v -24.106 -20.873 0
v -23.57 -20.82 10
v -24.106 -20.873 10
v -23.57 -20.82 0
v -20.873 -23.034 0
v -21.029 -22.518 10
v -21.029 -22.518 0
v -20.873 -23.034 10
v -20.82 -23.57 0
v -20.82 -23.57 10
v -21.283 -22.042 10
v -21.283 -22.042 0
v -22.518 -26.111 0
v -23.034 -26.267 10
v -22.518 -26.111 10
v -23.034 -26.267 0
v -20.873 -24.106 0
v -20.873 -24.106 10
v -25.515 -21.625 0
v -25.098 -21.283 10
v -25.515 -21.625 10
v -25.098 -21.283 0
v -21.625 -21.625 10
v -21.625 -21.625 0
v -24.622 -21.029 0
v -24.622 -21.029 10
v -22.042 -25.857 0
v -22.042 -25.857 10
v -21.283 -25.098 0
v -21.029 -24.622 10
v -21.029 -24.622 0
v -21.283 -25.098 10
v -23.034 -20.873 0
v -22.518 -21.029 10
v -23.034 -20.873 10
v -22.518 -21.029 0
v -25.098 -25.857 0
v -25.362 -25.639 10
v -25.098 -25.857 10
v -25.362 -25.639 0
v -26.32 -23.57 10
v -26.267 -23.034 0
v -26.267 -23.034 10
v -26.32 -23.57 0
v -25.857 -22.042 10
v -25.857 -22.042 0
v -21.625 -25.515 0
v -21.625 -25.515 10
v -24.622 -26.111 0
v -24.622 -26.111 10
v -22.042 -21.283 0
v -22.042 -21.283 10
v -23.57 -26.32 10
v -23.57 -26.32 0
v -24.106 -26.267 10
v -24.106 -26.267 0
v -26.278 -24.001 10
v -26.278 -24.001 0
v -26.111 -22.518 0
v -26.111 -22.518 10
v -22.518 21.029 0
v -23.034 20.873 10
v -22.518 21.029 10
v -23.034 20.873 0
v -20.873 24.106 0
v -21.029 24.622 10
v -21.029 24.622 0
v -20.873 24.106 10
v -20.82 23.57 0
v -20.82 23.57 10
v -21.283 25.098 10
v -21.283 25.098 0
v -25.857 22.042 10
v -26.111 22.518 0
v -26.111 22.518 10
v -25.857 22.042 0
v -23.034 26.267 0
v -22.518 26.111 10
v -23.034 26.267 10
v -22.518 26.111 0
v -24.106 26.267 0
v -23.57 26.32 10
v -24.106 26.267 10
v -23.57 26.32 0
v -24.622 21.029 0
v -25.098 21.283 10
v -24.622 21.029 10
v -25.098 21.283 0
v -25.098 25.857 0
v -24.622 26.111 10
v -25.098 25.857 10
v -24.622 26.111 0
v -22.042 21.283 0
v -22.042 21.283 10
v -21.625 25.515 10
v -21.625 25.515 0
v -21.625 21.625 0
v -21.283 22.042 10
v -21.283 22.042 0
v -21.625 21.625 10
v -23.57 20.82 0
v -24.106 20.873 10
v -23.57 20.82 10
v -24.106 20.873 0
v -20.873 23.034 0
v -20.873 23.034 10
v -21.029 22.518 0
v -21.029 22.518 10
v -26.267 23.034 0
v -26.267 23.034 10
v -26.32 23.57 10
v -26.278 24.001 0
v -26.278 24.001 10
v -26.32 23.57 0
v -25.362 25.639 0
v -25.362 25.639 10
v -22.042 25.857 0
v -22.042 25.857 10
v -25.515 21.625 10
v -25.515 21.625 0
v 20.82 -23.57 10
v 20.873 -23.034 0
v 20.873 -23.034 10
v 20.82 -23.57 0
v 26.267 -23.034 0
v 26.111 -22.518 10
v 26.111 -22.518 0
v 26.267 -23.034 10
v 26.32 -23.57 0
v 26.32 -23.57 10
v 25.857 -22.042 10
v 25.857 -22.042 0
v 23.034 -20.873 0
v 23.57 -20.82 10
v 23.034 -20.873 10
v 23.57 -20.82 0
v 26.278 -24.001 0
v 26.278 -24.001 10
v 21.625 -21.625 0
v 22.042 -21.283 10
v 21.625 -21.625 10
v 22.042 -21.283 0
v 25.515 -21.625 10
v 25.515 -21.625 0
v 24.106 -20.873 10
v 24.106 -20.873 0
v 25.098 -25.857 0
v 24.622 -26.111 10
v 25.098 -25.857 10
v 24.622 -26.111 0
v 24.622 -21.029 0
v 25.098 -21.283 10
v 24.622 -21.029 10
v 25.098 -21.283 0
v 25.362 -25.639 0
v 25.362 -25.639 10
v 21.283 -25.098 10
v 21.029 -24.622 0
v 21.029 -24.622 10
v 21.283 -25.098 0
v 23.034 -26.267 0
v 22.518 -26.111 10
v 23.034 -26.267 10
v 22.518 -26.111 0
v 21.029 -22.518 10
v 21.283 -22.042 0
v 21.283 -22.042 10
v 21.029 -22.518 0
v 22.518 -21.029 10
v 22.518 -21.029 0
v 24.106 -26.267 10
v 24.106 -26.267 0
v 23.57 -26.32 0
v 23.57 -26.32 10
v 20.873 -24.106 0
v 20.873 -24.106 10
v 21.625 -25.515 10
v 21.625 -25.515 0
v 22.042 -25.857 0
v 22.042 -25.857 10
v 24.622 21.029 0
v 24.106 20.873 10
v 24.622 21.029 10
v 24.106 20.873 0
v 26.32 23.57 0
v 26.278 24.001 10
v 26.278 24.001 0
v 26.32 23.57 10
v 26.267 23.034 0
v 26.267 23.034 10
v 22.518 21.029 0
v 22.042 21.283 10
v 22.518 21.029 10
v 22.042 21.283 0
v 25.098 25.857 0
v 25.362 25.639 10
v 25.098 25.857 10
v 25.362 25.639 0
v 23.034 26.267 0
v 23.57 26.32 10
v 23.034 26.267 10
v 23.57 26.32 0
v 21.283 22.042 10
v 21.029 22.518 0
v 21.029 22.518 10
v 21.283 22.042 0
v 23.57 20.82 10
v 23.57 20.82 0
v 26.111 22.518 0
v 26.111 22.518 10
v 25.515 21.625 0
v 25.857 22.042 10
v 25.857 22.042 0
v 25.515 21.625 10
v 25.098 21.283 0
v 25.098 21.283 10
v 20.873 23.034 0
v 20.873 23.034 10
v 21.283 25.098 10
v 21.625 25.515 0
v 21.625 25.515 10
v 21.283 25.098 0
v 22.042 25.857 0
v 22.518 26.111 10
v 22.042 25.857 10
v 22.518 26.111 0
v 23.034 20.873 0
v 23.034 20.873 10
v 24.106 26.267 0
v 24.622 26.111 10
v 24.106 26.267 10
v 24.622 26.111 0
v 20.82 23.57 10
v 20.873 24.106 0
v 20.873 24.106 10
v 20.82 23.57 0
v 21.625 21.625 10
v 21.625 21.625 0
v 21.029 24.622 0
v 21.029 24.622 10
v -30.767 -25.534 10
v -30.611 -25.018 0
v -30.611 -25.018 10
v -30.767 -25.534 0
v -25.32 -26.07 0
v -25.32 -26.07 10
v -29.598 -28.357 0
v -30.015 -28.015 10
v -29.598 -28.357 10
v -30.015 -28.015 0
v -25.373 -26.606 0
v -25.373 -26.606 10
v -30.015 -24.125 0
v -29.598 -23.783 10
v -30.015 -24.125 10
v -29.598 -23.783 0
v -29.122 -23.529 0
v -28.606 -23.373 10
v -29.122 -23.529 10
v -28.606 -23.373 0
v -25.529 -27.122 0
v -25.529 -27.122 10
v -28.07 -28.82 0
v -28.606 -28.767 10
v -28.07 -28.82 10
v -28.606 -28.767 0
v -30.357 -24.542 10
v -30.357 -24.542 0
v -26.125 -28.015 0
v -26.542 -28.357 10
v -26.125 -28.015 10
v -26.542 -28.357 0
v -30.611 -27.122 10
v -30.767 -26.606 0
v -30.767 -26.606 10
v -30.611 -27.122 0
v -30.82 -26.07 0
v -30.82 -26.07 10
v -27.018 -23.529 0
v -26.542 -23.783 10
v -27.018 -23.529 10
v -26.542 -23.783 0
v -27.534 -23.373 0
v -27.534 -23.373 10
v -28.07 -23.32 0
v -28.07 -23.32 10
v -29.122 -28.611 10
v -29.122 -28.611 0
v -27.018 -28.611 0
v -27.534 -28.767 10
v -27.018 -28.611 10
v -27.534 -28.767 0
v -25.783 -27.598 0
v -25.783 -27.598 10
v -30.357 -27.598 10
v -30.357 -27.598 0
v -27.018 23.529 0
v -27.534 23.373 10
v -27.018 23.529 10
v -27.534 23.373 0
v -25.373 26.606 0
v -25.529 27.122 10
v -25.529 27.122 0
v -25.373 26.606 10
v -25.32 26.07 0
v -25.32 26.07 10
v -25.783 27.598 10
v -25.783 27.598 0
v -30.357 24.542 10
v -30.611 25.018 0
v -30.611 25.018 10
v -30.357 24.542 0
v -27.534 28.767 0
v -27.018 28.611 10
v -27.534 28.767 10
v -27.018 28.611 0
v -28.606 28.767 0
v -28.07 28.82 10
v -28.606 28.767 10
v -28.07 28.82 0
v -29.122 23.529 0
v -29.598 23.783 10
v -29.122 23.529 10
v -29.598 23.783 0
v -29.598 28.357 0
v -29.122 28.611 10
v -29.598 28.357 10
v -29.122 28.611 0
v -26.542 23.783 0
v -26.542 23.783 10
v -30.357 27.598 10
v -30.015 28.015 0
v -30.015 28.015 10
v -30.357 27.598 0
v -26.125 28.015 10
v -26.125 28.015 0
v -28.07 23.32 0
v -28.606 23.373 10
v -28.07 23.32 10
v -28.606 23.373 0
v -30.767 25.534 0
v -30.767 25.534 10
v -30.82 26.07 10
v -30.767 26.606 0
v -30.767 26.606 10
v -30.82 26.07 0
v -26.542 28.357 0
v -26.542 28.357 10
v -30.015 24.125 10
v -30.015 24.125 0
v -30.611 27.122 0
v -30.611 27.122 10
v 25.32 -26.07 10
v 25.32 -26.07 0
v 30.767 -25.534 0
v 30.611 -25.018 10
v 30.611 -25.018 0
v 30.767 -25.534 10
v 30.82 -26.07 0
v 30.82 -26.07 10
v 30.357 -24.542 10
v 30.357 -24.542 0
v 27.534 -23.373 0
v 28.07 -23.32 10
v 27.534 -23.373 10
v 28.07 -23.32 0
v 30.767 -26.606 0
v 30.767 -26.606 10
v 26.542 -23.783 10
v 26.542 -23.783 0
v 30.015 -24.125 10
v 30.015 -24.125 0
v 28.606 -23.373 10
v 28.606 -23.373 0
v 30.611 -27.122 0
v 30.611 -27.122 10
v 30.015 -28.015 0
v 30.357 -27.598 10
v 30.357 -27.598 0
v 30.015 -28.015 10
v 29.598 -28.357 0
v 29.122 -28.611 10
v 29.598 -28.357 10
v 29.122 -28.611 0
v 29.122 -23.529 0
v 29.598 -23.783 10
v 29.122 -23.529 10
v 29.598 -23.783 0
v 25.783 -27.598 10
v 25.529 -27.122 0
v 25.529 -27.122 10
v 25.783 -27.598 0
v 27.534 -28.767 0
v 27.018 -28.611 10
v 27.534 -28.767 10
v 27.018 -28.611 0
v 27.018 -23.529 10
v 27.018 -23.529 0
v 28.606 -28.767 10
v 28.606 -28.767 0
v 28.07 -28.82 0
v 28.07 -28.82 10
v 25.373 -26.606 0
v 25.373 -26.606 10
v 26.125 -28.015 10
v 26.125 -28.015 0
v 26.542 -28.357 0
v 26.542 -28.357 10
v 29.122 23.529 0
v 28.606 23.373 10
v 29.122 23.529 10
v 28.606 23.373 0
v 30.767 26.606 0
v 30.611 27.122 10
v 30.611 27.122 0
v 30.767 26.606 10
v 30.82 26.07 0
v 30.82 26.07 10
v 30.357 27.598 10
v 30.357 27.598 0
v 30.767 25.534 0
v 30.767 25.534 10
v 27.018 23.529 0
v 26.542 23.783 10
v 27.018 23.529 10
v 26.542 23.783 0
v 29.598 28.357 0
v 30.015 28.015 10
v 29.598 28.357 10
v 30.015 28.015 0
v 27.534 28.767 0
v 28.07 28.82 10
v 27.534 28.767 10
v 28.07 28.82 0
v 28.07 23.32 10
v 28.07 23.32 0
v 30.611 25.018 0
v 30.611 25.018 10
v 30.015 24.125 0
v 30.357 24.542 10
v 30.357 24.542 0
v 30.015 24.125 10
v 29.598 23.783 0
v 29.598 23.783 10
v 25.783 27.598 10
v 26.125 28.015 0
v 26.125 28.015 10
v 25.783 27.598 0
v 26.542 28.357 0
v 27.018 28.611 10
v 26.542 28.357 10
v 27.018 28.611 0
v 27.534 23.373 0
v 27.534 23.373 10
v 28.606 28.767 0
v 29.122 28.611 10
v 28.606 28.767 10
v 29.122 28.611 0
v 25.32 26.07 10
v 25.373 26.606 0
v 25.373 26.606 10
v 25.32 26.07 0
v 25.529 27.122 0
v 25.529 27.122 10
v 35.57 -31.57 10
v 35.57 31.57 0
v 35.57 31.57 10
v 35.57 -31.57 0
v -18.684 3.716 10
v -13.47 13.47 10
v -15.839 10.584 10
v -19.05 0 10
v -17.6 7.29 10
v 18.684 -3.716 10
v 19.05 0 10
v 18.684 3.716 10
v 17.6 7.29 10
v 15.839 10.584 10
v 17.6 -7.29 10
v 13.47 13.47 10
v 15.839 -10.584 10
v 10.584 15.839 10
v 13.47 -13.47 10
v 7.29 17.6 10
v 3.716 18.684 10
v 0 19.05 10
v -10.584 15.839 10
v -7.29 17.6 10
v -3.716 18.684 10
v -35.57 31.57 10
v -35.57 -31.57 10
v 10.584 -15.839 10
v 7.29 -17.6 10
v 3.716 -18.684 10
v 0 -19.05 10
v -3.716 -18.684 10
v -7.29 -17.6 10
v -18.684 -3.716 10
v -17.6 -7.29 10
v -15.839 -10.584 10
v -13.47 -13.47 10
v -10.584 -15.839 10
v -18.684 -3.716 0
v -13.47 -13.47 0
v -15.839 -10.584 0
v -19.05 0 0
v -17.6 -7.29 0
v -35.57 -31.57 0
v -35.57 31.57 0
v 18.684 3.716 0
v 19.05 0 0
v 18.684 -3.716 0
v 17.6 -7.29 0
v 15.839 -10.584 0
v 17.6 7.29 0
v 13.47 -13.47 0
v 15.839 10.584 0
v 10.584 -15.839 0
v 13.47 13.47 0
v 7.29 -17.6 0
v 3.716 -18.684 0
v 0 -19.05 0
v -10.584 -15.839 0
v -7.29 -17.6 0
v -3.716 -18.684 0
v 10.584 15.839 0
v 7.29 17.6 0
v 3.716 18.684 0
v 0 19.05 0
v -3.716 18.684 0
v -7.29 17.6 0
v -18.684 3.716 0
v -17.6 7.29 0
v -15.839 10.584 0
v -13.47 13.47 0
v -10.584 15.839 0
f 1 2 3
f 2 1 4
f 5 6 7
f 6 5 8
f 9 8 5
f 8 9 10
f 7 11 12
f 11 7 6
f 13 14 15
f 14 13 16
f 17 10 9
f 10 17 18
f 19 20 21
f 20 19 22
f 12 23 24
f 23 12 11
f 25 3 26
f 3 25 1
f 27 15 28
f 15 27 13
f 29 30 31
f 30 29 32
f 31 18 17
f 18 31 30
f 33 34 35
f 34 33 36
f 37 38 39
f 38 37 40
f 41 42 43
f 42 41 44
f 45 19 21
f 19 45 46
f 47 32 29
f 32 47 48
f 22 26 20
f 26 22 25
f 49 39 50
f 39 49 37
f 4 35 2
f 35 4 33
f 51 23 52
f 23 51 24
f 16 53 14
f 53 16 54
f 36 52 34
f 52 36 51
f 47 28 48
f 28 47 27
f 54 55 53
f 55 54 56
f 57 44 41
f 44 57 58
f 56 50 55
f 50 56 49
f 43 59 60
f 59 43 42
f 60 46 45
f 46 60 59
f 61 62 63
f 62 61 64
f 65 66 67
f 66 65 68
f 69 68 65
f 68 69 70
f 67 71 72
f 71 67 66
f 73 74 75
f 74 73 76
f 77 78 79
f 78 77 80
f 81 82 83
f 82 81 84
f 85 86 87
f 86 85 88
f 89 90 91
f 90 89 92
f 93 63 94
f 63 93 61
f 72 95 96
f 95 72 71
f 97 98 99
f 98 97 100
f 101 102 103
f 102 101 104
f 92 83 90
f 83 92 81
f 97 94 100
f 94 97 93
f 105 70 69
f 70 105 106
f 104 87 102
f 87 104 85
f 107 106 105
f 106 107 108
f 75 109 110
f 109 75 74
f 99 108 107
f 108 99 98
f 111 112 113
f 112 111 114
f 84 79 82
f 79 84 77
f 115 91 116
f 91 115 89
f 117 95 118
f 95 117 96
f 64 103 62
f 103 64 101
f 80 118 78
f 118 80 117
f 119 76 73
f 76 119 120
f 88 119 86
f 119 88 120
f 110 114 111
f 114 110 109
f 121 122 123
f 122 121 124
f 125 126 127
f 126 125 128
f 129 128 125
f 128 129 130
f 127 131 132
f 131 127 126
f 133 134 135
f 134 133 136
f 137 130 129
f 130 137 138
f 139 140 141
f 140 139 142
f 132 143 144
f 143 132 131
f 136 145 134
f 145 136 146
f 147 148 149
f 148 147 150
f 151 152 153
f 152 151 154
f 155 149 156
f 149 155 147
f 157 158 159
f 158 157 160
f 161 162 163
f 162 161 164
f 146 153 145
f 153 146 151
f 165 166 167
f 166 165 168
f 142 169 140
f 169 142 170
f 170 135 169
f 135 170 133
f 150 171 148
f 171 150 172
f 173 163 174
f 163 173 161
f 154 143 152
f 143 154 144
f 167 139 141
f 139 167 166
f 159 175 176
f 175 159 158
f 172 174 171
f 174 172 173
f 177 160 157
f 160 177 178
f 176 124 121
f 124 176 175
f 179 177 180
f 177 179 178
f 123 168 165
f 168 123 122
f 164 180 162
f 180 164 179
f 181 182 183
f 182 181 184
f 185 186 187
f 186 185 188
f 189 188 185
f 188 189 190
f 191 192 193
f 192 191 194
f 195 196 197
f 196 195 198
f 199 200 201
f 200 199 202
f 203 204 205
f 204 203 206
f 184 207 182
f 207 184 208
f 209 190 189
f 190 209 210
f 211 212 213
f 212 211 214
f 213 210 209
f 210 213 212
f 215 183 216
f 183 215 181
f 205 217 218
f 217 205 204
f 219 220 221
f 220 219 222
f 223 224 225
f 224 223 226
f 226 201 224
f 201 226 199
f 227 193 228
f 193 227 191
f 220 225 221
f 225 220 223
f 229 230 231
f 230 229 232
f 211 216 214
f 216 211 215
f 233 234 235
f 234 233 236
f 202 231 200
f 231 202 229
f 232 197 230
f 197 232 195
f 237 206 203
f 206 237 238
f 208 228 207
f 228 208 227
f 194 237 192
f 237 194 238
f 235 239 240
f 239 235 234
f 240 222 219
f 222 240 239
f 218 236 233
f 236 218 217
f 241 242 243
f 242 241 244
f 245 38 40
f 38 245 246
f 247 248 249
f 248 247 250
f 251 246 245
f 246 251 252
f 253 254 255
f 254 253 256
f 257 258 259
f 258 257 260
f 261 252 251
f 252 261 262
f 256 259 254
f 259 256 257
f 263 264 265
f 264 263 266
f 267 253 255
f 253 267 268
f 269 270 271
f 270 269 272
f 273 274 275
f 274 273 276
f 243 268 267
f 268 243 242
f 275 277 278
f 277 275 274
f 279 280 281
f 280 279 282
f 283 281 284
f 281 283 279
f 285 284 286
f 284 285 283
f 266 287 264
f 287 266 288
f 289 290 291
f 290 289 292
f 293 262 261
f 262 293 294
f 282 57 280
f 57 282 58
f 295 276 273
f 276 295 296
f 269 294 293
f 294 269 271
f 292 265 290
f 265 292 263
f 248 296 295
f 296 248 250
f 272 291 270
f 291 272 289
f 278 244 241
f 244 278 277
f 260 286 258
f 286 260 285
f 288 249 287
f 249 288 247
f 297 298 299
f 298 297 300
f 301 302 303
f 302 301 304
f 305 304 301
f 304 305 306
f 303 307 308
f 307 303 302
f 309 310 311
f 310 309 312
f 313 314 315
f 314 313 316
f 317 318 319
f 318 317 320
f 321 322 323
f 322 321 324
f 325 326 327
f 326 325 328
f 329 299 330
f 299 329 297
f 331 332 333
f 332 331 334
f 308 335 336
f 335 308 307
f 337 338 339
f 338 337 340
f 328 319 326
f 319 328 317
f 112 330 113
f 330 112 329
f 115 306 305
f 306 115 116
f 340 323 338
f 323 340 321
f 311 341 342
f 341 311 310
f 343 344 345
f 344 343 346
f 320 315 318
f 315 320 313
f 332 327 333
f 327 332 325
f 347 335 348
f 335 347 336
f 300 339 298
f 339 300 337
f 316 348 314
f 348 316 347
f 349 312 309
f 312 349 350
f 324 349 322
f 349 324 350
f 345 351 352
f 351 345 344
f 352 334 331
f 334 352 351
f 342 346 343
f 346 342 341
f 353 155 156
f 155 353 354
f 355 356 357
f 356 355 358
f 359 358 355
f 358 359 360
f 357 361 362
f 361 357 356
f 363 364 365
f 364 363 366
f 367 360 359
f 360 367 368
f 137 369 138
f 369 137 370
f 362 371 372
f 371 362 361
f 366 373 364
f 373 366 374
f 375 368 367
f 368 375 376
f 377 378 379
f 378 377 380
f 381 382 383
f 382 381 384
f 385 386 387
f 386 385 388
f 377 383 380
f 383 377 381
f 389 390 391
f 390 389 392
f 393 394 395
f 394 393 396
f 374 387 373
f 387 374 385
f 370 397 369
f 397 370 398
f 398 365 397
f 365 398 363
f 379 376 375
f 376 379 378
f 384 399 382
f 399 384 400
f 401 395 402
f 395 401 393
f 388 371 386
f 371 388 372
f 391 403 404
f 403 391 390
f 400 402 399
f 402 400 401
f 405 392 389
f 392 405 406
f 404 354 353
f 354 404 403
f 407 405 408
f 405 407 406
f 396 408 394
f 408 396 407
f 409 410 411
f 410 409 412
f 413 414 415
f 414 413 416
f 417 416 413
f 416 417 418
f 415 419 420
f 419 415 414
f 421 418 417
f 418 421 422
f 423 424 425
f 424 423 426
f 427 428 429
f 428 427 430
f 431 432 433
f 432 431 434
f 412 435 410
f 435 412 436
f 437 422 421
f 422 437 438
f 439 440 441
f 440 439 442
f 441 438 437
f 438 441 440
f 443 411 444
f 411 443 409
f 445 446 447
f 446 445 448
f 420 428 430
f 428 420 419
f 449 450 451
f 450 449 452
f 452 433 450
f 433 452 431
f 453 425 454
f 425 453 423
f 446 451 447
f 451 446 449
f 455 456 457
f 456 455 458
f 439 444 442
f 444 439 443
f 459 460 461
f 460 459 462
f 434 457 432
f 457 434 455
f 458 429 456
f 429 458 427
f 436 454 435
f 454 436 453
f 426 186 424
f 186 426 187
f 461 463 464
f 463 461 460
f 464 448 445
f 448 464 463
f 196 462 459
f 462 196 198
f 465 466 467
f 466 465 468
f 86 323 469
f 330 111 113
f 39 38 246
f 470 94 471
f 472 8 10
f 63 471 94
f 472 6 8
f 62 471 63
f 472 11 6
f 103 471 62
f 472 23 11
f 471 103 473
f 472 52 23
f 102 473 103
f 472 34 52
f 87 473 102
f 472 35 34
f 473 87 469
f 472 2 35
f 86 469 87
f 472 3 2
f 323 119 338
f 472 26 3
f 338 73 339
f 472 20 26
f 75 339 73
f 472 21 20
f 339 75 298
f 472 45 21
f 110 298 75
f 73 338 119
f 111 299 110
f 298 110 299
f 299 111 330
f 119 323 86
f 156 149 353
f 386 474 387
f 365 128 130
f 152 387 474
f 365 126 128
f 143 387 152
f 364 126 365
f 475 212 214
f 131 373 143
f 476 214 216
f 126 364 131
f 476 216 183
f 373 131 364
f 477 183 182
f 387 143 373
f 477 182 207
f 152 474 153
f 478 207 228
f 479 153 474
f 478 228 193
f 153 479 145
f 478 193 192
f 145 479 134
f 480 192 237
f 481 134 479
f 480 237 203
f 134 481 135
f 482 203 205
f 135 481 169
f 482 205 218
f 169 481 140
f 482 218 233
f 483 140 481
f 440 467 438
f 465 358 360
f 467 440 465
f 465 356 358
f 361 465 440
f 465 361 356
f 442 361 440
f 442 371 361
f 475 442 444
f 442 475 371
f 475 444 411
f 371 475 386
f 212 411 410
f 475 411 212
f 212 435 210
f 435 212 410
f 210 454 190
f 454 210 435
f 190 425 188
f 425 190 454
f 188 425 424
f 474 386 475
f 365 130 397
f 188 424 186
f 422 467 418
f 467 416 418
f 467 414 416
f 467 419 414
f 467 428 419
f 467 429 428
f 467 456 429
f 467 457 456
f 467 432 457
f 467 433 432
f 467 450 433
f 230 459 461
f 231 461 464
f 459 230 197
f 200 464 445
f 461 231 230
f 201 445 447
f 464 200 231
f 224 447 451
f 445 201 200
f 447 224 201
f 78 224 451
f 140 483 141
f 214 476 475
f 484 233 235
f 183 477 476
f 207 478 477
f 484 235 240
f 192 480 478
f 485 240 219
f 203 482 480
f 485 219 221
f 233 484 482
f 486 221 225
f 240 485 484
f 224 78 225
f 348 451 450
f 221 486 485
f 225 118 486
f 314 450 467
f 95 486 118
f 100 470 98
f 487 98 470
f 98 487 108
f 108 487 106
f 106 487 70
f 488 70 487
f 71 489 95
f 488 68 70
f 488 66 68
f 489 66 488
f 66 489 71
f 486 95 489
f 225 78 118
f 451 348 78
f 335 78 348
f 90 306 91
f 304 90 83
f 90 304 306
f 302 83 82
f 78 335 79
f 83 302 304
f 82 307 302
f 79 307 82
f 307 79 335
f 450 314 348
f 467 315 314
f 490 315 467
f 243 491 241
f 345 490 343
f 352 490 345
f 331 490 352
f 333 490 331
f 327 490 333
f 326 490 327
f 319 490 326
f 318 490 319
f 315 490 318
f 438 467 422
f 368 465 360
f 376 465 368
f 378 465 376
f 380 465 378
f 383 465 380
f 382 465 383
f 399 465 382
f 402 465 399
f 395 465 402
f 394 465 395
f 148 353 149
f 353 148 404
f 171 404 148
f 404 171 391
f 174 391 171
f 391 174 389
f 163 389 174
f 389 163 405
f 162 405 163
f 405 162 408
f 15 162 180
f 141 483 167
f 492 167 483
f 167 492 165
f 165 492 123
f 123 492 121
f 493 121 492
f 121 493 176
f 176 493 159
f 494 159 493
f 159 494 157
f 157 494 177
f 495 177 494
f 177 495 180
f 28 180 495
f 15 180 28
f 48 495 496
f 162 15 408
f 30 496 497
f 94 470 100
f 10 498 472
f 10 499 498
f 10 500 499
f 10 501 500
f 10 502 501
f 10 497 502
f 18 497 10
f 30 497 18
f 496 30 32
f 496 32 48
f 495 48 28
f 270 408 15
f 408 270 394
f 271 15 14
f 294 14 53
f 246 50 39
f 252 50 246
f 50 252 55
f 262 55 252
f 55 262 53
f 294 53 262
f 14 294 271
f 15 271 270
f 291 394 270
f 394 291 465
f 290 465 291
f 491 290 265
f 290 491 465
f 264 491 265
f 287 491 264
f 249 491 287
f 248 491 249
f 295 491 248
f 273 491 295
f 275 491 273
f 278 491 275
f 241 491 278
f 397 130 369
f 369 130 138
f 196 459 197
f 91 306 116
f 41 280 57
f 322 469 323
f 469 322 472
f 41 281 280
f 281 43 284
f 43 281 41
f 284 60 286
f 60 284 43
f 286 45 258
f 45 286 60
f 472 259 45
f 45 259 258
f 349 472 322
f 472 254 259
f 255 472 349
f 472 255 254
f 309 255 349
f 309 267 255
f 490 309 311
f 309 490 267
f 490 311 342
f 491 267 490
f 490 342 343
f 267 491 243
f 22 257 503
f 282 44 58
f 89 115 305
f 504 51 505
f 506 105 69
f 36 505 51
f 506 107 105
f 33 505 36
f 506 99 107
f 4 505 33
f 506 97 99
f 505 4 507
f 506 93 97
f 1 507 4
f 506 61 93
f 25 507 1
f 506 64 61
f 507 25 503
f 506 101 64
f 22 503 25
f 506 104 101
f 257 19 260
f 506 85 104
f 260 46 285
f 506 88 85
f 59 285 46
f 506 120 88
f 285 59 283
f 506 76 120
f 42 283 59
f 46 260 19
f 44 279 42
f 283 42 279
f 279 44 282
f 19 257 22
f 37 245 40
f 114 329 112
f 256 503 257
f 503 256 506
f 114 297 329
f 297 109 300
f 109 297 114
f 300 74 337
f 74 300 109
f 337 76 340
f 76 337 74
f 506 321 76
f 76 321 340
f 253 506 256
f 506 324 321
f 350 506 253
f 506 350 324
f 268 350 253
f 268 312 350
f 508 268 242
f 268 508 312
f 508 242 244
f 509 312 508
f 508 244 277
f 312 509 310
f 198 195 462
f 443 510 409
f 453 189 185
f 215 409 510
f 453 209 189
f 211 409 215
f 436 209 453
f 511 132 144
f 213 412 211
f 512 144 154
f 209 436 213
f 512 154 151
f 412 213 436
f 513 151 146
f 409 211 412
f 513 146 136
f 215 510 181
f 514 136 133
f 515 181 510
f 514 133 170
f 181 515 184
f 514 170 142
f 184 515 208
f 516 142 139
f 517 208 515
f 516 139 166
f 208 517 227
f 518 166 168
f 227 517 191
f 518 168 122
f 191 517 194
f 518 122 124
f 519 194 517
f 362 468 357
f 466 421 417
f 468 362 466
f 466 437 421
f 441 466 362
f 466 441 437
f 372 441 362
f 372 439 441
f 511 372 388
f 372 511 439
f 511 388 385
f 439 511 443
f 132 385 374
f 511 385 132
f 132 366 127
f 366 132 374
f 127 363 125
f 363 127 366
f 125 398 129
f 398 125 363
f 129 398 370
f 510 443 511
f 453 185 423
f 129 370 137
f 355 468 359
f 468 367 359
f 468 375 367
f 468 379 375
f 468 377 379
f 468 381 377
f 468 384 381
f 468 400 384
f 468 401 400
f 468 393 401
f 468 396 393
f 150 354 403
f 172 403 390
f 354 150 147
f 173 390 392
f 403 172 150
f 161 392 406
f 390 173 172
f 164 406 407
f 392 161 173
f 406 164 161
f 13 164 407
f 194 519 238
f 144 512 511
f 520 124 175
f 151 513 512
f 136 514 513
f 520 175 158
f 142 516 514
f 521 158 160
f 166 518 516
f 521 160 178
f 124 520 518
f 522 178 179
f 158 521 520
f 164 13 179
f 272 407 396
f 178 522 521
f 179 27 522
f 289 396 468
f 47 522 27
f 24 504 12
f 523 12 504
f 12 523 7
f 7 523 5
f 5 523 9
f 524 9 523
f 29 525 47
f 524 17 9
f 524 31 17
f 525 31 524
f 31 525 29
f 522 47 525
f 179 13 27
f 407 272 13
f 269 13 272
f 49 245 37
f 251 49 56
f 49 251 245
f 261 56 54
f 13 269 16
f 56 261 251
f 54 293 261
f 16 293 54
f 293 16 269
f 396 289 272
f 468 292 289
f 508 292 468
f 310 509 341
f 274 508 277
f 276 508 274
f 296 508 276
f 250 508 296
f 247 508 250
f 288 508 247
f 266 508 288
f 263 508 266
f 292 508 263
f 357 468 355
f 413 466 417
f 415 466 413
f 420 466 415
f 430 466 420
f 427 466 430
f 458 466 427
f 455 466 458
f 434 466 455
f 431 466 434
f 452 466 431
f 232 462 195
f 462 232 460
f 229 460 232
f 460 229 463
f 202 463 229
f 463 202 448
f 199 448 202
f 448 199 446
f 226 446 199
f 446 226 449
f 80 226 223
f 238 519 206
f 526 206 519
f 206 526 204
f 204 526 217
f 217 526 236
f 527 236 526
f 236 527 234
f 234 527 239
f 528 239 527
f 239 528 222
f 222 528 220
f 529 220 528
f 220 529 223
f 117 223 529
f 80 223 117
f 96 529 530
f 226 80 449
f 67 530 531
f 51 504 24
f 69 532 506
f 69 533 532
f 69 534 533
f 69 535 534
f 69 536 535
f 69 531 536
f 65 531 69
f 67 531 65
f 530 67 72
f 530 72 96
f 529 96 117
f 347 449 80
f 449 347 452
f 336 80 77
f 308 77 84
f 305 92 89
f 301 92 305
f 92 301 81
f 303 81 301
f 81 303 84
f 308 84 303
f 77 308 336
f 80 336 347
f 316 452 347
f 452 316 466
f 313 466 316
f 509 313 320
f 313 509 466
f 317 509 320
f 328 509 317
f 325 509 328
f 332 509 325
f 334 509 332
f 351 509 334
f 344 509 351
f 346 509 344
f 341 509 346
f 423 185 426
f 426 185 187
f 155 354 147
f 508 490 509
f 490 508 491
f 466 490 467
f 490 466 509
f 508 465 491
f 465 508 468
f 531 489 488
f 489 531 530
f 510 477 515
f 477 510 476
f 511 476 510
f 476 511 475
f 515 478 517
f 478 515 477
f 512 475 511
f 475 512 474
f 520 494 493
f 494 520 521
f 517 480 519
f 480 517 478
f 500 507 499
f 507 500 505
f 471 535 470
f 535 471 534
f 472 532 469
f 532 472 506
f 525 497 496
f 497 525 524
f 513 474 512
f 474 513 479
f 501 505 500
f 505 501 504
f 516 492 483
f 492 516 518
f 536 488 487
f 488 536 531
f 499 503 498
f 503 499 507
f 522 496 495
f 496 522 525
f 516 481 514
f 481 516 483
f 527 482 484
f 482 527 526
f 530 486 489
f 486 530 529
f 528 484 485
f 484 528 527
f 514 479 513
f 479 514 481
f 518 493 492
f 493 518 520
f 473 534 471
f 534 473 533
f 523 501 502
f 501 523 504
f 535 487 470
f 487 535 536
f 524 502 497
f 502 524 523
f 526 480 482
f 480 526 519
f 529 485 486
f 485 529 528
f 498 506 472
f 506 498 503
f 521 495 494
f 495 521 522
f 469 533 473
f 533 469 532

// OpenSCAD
$fn = 32;

// ----------------------------------------------------------------------
// Motor mount plate: NEMA23, 71.14 x 63.14 x 10 mm
// ----------------------------------------------------------------------

// --- parameters (mm) ---
plate_w = 71.14;          // plate length, X
plate_d = 63.14;          // plate width, Y
plate_t = 10;             // plate thickness
pattern = 47.14;          // NEMA23 bolt spacing
motor_d = 5.5;            // NEMA23 screw clearance
pilot_d = 38.1;           // pilot boss bore
second_d = 5.5;           // second fastener hole

module plate() {
  translate([-plate_w / 2, -plate_d / 2, 0]) cube([plate_w, plate_d, plate_t]);
}

module motor_holes() {
  for (sx = [-1, 1]) for (sy = [-1, 1])
    translate([sx * pattern / 2, sy * pattern / 2, -1])
      cylinder(h = plate_t + 2, d = motor_d);
}

difference() {
  union() {
    plate();
  }
  motor_holes();
  translate([0, 0, -1]) cylinder(h = plate_t + 2, d = pilot_d);
  for (sx = [-1, 1]) for (sy = [-1, 1])
    translate([sx * 28.07, sy * 26.07, -1]) cylinder(h = plate_t + 2, d = second_d);
}
